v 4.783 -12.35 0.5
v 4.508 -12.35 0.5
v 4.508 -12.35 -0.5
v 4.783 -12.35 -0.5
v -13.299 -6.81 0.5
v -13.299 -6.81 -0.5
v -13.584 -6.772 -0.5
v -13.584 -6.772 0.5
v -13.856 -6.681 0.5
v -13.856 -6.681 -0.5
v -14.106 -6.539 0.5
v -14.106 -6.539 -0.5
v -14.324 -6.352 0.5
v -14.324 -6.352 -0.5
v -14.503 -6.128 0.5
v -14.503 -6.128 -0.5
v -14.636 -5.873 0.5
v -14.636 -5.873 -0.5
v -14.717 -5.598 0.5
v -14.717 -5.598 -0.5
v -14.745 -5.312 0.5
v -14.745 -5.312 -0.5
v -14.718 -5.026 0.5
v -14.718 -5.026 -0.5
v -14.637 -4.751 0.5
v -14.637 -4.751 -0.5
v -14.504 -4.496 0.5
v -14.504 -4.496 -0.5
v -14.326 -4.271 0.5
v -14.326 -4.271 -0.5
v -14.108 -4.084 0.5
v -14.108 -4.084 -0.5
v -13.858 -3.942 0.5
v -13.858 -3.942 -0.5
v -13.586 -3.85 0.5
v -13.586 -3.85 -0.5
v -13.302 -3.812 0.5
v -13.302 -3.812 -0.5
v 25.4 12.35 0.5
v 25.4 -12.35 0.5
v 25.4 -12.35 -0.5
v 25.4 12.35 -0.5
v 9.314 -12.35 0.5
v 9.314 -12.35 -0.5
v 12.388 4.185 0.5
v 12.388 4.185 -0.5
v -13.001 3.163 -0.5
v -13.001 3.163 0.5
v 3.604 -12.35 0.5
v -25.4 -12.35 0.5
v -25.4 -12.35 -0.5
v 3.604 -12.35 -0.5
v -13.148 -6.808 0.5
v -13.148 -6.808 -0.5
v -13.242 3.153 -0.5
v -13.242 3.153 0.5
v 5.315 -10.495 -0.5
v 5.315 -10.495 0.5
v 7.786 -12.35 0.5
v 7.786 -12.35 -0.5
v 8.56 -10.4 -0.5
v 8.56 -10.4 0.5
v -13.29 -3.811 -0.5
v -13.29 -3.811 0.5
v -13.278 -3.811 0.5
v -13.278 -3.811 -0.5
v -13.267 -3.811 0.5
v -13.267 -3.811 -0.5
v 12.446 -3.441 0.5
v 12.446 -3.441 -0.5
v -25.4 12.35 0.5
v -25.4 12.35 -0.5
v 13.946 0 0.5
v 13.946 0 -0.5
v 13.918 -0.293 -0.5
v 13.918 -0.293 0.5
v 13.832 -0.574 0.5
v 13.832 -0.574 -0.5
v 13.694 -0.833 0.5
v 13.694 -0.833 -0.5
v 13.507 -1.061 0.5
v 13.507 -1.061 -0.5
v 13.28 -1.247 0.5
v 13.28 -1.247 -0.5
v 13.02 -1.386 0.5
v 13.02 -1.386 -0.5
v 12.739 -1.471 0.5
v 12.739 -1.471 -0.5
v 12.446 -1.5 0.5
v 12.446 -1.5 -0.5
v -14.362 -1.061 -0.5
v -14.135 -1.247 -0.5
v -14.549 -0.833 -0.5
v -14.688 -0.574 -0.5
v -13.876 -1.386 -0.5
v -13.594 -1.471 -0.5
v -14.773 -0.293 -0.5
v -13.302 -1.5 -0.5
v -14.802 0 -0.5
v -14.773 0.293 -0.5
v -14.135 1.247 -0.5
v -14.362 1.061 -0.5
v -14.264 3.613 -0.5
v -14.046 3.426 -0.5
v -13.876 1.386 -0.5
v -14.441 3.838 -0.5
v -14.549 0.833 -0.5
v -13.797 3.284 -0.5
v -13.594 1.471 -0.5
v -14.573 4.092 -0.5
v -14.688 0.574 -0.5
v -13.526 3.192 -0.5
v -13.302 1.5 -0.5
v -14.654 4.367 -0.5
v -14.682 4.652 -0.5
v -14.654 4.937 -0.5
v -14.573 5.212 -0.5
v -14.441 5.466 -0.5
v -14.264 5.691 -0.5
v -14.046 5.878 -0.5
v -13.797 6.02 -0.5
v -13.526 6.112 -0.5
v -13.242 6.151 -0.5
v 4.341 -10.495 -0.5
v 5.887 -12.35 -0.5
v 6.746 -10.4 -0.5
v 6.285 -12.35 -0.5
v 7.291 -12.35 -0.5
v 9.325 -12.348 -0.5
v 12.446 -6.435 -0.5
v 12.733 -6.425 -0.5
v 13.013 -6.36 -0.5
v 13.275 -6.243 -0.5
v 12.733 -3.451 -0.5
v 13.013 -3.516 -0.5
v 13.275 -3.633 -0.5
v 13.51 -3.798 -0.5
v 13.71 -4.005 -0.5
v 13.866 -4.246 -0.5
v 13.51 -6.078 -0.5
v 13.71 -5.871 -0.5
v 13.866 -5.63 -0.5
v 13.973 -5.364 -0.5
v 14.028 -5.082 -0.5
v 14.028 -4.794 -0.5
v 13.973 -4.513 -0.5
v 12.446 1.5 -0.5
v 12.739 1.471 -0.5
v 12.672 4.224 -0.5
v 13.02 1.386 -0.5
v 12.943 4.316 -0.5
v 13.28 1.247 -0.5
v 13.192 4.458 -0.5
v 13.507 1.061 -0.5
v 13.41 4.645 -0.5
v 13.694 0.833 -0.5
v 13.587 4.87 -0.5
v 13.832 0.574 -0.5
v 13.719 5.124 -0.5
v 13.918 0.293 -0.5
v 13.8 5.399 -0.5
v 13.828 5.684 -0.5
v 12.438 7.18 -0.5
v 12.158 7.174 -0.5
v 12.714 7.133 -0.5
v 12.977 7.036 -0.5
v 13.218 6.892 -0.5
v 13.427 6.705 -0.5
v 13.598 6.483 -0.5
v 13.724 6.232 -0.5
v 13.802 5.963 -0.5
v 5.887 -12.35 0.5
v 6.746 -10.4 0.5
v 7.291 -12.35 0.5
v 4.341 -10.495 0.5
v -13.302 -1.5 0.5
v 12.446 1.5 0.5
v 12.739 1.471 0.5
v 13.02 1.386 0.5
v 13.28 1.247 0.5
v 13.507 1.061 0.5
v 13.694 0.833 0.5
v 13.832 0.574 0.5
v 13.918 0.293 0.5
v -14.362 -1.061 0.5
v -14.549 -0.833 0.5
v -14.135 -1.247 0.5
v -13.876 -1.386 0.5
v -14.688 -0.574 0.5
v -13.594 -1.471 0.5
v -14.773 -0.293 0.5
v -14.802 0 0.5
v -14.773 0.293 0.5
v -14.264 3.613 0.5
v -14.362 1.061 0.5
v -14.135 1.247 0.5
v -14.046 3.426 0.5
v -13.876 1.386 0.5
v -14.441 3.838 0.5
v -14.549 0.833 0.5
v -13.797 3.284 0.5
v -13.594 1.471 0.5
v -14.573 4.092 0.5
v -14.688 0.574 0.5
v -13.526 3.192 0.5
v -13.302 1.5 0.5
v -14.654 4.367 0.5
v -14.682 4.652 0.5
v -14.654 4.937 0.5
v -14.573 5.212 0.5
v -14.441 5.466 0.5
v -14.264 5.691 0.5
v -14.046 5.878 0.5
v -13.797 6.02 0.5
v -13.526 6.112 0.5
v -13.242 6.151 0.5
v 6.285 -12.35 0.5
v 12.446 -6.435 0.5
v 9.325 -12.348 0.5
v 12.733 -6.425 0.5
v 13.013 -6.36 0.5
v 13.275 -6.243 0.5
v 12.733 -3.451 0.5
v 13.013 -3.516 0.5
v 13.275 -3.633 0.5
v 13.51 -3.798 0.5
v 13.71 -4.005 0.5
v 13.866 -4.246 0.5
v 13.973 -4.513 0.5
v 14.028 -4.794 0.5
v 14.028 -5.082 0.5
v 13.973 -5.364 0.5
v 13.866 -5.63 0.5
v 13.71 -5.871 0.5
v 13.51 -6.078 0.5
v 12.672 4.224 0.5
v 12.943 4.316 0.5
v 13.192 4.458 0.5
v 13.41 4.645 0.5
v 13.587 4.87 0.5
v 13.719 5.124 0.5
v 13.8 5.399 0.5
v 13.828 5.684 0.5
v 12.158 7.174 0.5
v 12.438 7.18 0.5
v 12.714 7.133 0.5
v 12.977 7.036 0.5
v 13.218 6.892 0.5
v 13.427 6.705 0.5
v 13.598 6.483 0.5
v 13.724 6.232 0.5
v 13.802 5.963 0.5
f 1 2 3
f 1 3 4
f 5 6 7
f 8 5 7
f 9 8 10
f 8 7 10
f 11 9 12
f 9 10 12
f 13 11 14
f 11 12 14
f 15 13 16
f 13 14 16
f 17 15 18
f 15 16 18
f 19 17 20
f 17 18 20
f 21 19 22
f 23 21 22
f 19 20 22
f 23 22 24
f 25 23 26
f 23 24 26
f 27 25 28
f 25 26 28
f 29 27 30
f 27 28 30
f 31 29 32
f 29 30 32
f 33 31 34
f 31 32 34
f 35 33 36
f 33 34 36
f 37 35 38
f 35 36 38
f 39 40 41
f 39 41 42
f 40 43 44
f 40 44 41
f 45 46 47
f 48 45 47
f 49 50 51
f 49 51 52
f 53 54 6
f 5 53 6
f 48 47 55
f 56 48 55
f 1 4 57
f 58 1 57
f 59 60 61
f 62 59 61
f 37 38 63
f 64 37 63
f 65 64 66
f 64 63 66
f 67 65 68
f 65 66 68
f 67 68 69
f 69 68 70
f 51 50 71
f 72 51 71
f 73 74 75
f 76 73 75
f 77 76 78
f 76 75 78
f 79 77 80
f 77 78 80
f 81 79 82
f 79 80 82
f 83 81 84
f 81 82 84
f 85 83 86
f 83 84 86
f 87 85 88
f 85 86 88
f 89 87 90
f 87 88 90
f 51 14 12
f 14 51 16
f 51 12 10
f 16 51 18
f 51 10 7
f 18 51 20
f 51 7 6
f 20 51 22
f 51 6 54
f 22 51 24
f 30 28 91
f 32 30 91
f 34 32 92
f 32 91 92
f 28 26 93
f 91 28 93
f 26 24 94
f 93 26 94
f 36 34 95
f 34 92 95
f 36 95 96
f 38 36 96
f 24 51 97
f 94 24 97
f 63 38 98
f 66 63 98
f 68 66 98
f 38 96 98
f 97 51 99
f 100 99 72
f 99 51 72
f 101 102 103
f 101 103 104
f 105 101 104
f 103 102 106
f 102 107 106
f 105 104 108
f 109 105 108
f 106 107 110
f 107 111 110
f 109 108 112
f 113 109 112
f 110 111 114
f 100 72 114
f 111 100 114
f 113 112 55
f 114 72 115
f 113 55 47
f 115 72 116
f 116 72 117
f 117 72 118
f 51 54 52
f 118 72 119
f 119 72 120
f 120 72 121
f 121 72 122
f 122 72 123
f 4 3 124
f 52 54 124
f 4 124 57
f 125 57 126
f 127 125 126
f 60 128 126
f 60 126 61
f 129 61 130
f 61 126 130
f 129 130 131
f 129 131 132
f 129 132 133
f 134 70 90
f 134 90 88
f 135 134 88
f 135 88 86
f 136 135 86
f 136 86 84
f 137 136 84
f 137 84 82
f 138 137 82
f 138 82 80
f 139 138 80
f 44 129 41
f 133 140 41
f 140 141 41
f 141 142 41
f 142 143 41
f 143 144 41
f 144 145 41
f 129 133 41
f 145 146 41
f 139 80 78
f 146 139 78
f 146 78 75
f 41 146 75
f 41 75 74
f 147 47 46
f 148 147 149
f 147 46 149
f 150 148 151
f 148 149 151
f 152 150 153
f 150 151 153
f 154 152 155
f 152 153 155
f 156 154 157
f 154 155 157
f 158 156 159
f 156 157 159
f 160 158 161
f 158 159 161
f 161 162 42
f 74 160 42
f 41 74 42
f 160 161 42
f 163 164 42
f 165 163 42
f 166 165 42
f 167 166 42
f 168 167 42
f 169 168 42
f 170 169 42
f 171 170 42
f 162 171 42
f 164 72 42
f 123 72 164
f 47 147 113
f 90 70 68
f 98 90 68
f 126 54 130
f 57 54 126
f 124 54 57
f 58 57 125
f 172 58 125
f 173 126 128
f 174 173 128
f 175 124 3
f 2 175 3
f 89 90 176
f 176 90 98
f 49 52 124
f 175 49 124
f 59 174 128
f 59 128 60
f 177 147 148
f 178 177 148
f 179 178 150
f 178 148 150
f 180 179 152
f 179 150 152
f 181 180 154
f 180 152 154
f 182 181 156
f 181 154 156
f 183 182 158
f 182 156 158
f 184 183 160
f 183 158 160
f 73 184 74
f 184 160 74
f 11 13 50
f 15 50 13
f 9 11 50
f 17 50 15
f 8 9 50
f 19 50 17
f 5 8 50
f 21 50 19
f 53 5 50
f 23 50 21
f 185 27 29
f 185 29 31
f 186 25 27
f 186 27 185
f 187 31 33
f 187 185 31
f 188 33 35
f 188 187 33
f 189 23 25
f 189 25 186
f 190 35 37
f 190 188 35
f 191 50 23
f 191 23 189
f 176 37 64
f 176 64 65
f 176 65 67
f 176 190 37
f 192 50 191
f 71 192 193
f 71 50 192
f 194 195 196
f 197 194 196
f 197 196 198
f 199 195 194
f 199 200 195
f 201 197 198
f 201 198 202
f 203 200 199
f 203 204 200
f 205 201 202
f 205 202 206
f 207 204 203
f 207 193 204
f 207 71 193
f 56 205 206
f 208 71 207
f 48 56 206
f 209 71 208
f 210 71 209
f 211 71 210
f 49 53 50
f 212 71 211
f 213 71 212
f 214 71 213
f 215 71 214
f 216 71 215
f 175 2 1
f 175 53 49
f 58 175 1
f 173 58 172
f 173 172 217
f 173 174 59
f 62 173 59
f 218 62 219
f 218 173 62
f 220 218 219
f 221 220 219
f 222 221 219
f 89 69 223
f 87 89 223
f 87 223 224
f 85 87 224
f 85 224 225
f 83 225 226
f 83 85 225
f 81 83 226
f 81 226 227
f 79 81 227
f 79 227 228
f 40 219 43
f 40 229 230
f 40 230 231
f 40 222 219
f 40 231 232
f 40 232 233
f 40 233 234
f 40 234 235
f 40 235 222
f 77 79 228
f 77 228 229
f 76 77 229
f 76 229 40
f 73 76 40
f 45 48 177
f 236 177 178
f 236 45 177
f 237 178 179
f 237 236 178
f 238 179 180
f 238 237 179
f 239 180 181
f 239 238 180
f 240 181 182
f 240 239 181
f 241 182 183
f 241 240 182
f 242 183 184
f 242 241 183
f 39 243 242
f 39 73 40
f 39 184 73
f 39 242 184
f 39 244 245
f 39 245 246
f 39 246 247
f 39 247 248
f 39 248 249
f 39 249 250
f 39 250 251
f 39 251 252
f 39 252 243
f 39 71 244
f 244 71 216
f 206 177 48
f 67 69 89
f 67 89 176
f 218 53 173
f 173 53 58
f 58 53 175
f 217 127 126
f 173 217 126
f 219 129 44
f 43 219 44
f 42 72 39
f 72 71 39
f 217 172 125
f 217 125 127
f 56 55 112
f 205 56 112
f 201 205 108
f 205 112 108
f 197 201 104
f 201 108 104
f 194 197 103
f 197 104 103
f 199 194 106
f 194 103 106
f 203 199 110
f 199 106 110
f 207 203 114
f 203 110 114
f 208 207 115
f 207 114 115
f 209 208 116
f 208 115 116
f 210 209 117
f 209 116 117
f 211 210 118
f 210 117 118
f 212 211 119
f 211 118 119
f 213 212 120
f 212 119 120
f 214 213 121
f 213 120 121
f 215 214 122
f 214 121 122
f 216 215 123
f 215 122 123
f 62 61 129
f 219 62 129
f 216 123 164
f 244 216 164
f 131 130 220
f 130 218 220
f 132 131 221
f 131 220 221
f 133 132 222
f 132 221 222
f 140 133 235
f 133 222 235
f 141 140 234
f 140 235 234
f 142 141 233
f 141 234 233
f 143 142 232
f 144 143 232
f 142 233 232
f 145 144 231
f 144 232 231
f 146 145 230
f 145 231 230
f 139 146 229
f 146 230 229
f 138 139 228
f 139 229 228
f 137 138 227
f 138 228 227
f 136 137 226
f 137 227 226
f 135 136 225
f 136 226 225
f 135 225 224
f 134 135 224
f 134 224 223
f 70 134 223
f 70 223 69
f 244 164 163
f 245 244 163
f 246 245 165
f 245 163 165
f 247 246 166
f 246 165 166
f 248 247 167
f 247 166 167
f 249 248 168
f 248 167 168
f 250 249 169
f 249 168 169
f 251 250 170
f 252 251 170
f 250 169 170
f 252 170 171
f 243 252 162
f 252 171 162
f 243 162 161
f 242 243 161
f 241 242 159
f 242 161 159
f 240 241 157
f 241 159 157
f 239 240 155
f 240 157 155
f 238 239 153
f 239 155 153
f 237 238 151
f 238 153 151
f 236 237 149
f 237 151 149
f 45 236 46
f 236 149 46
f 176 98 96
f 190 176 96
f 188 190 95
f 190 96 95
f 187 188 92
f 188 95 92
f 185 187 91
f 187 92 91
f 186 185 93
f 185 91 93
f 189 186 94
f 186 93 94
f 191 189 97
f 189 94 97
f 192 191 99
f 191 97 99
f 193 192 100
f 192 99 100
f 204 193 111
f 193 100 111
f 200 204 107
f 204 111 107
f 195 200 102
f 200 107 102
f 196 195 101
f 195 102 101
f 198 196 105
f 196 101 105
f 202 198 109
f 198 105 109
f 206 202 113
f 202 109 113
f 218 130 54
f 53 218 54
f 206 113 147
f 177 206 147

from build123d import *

# Parameters (mm, degrees)
F0_W     = 50.8
F0_H     = 24.7
F1_DEPTH = 0.5
F2_R     = 1.5
F3_DEPTH = 25
F5_DEPTH = 25
F6_DEPTH = 25
F7_DEPTH = 25
F9_DEPTH = 25


with BuildPart() as f1:
    # F0 (on Top) → F1 (new body, symmetric)
    with BuildSketch(Plane.XY):
        Rectangle(F0_W, F0_H)
    extrude(amount=F1_DEPTH, both=True)

    # F2 (on face) → F3 (cut)
    with BuildSketch(Plane.XY.offset(0.5)):
        with Locations((12.5349592417, -4.9380455166)):
            Circle(F2_R)
    extrude(amount=-F3_DEPTH, mode=Mode.SUBTRACT)

    # F4 (on face) → F5 (cut)
    with BuildSketch(Plane(origin=(0, 0, -0.5), x_dir=(1, 0, 0), z_dir=(0, 0, -1))):
        with BuildLine():
            ThreePointArc((-13.2667996844, 3.8108435868), (-12.1922088341, 4.2424211974), (-11.7452072576, 5.3106881678))
            ThreePointArc((-11.7452072576, 5.3106881678), (-12.1505501018, 6.3362249596), (-13.147508206, 6.8075030847))
            Line((-13.147508206, 6.8075030847), (-13.2993535533, 6.8097105755))
            Line((-13.2993535533, 6.8097105755), (-13.2452072576, 5.3106881678))
            Line((-13.2452072576, 5.3106881678), (-13.3017715787, 3.8117550547))
            ThreePointArc((-13.3017715787, 3.8117550547), (-13.2842882888, 3.8111973632), (-13.2667996844, 3.8108435868))
        make_face()
        with BuildLine():
            Line((-13.2452072576, 5.3106881678), (-13.2993535533, 6.8097105755))
            ThreePointArc((-13.2993535533, 6.8097105755), (-14.7452067697, 5.3118980046), (-13.3017715787, 3.8117550547))
            Line((-13.3017715787, 3.8117550547), (-13.2452072576, 5.3106881678))
        make_face()
    extrude(amount=-F5_DEPTH, mode=Mode.SUBTRACT)

    # F4 (on face) → F6 (cut)
    with BuildSketch(Plane(origin=(0, 0, -0.5), x_dir=(1, 0, 0), z_dir=(0, 0, -1))):
        with BuildLine():
            ThreePointArc((-13.147508206, 6.8075030847), (-12.1505501018, 6.3362249596), (-11.7452072576, 5.3106881678))
            ThreePointArc((-11.7452072576, 5.3106881678), (-12.1922088341, 4.2424211974), (-13.2667996844, 3.8108435868))
            Line((-13.2667996844, 3.8108435868), (12.4463466927, 3.4406651988))
            ThreePointArc((12.4463466927, 3.4406651988), (11.0349592417, 4.9380455166), (12.4463466927, 6.4354258344))
            Line((12.4463466927, 6.4354258344), (-13.147508206, 6.8075030847))
        make_face()
    extrude(amount=-F6_DEPTH, mode=Mode.SUBTRACT)

    # F4 (on face) → F7 (cut)
    with BuildSketch(Plane(origin=(0, 0, -0.5), x_dir=(1, 0, 0), z_dir=(0, 0, -1))):
        with BuildLine():
            ThreePointArc((12.4463466927, -1.5), (13.5070068645, -1.0606601718), (13.9463466927, 0))
            ThreePointArc((13.9463466927, 0), (13.5070068645, 1.0606601718), (12.4463466927, 1.5))
            Line((12.4463466927, 1.5), (12.4463466927, -1.5))
        make_face()
        with BuildLine():
            Line((12.4463466927, -1.5), (12.4463466927, 1.5))
            ThreePointArc((12.4463466927, 1.5), (10.9463466927, 0), (12.4463466927, -1.5))
        make_face()
        with BuildLine():
            ThreePointArc((12.4463466927, -1.5), (10.9463466927, 0), (12.4463466927, 1.5))
            Line((12.4463466927, 1.5), (-13.3017869666, 1.5))
            ThreePointArc((-13.3017869666, 1.5), (-12.2411267948, 1.0606601718), (-11.8017869666, 0))
            ThreePointArc((-11.8017869666, 0), (-12.2411267948, -1.0606601718), (-13.3017869666, -1.5))
            Line((-13.3017869666, -1.5), (12.4463466927, -1.5))
        make_face()
        with BuildLine():
            ThreePointArc((-11.8017869666, 0), (-12.2411267948, 1.0606601718), (-13.3017869666, 1.5))
            Line((-13.3017869666, 1.5), (-13.3017869666, -1.5))
            ThreePointArc((-13.3017869666, -1.5), (-12.2411267948, -1.0606601718), (-11.8017869666, 0))
        make_face()
        with BuildLine():
            Line((-13.3017869666, -1.5), (-13.3017869666, 1.5))
            ThreePointArc((-13.3017869666, 1.5), (-14.8017869666, 0), (-13.3017869666, -1.5))
        make_face()
        with BuildLine():
            ThreePointArc((12.1577924413, -7.1743104644), (13.3265385473, -6.8031241581), (13.8277874587, -5.6839743633))
            ThreePointArc((13.8277874587, -5.6839743633), (13.4095745674, -4.6448705901), (12.3881385899, -4.1851889414))
            Line((12.3881385899, -4.1851889414), (12.1577924413, -7.1743104644))
        make_face()
        with BuildLine():
            Line((12.1577924413, -7.1743104644), (12.3881385899, -4.1851889414))
            ThreePointArc((12.3881385899, -4.1851889414), (10.8322215741, -5.5687238327), (12.1577924413, -7.1743104644))
        make_face()
        with BuildLine():
            ThreePointArc((12.1577924413, -7.1743104644), (10.8322215741, -5.5687238327), (12.3881385899, -4.1851889414))
            Line((12.3881385899, -4.1851889414), (-13.0010832561, -3.162848961))
            ThreePointArc((-13.0010832561, -3.162848961), (-12.0590596608, -3.6572043001), (-11.6817944423, -4.6519236627))
            ThreePointArc((-11.6817944423, -4.6519236627), (-12.1427083133, -5.733727719), (-13.2421944641, -6.1507071151))
            Line((-13.2421944641, -6.1507071151), (12.1577924413, -7.1743104644))
        make_face()
        with BuildLine():
            ThreePointArc((-11.6817944423, -4.6519236627), (-12.0590596608, -3.6572043001), (-13.0010832561, -3.162848961))
            Line((-13.0010832561, -3.162848961), (-13.2421944641, -3.1531402102))
            Line((-13.2421944641, -3.1531402102), (-13.2421944641, -6.1507071151))
            ThreePointArc((-13.2421944641, -6.1507071151), (-12.1427083133, -5.733727719), (-11.6817944423, -4.6519236627))
        make_face()
        with BuildLine():
            ThreePointArc((-13.2421944641, -3.1531402102), (-14.6817944423, -4.6519236627), (-13.2421944641, -6.1507071151))
            Line((-13.2421944641, -6.1507071151), (-13.2421944641, -3.1531402102))
        make_face()
    extrude(amount=-F7_DEPTH, mode=Mode.SUBTRACT)

    # F8 (on face) → F9 (cut)
    with BuildSketch(Plane(origin=(0, 0, -0.5), x_dir=(1, 0, 0), z_dir=(0, 0, -1))):
        Polygon((8.5604507476, 10.399765335), (9.3251494691, 12.3484628275), (9.31405598, 12.35), (7.7857054425, 12.35), align=None)
        Polygon((6.7462604493, 10.399765335), (7.2912084784, 12.35), (6.2853197637, 12.35), align=None)
        Polygon((5.3150104359, 10.4954689741), (5.8871536403, 12.35), (4.7833247403, 12.35), align=None)
        Polygon((4.5080462822, 12.35), (3.6044052231, 12.35), (4.3411315419, 10.4954689741), align=None)
    extrude(amount=-F9_DEPTH, mode=Mode.SUBTRACT)


solid = f1.part
